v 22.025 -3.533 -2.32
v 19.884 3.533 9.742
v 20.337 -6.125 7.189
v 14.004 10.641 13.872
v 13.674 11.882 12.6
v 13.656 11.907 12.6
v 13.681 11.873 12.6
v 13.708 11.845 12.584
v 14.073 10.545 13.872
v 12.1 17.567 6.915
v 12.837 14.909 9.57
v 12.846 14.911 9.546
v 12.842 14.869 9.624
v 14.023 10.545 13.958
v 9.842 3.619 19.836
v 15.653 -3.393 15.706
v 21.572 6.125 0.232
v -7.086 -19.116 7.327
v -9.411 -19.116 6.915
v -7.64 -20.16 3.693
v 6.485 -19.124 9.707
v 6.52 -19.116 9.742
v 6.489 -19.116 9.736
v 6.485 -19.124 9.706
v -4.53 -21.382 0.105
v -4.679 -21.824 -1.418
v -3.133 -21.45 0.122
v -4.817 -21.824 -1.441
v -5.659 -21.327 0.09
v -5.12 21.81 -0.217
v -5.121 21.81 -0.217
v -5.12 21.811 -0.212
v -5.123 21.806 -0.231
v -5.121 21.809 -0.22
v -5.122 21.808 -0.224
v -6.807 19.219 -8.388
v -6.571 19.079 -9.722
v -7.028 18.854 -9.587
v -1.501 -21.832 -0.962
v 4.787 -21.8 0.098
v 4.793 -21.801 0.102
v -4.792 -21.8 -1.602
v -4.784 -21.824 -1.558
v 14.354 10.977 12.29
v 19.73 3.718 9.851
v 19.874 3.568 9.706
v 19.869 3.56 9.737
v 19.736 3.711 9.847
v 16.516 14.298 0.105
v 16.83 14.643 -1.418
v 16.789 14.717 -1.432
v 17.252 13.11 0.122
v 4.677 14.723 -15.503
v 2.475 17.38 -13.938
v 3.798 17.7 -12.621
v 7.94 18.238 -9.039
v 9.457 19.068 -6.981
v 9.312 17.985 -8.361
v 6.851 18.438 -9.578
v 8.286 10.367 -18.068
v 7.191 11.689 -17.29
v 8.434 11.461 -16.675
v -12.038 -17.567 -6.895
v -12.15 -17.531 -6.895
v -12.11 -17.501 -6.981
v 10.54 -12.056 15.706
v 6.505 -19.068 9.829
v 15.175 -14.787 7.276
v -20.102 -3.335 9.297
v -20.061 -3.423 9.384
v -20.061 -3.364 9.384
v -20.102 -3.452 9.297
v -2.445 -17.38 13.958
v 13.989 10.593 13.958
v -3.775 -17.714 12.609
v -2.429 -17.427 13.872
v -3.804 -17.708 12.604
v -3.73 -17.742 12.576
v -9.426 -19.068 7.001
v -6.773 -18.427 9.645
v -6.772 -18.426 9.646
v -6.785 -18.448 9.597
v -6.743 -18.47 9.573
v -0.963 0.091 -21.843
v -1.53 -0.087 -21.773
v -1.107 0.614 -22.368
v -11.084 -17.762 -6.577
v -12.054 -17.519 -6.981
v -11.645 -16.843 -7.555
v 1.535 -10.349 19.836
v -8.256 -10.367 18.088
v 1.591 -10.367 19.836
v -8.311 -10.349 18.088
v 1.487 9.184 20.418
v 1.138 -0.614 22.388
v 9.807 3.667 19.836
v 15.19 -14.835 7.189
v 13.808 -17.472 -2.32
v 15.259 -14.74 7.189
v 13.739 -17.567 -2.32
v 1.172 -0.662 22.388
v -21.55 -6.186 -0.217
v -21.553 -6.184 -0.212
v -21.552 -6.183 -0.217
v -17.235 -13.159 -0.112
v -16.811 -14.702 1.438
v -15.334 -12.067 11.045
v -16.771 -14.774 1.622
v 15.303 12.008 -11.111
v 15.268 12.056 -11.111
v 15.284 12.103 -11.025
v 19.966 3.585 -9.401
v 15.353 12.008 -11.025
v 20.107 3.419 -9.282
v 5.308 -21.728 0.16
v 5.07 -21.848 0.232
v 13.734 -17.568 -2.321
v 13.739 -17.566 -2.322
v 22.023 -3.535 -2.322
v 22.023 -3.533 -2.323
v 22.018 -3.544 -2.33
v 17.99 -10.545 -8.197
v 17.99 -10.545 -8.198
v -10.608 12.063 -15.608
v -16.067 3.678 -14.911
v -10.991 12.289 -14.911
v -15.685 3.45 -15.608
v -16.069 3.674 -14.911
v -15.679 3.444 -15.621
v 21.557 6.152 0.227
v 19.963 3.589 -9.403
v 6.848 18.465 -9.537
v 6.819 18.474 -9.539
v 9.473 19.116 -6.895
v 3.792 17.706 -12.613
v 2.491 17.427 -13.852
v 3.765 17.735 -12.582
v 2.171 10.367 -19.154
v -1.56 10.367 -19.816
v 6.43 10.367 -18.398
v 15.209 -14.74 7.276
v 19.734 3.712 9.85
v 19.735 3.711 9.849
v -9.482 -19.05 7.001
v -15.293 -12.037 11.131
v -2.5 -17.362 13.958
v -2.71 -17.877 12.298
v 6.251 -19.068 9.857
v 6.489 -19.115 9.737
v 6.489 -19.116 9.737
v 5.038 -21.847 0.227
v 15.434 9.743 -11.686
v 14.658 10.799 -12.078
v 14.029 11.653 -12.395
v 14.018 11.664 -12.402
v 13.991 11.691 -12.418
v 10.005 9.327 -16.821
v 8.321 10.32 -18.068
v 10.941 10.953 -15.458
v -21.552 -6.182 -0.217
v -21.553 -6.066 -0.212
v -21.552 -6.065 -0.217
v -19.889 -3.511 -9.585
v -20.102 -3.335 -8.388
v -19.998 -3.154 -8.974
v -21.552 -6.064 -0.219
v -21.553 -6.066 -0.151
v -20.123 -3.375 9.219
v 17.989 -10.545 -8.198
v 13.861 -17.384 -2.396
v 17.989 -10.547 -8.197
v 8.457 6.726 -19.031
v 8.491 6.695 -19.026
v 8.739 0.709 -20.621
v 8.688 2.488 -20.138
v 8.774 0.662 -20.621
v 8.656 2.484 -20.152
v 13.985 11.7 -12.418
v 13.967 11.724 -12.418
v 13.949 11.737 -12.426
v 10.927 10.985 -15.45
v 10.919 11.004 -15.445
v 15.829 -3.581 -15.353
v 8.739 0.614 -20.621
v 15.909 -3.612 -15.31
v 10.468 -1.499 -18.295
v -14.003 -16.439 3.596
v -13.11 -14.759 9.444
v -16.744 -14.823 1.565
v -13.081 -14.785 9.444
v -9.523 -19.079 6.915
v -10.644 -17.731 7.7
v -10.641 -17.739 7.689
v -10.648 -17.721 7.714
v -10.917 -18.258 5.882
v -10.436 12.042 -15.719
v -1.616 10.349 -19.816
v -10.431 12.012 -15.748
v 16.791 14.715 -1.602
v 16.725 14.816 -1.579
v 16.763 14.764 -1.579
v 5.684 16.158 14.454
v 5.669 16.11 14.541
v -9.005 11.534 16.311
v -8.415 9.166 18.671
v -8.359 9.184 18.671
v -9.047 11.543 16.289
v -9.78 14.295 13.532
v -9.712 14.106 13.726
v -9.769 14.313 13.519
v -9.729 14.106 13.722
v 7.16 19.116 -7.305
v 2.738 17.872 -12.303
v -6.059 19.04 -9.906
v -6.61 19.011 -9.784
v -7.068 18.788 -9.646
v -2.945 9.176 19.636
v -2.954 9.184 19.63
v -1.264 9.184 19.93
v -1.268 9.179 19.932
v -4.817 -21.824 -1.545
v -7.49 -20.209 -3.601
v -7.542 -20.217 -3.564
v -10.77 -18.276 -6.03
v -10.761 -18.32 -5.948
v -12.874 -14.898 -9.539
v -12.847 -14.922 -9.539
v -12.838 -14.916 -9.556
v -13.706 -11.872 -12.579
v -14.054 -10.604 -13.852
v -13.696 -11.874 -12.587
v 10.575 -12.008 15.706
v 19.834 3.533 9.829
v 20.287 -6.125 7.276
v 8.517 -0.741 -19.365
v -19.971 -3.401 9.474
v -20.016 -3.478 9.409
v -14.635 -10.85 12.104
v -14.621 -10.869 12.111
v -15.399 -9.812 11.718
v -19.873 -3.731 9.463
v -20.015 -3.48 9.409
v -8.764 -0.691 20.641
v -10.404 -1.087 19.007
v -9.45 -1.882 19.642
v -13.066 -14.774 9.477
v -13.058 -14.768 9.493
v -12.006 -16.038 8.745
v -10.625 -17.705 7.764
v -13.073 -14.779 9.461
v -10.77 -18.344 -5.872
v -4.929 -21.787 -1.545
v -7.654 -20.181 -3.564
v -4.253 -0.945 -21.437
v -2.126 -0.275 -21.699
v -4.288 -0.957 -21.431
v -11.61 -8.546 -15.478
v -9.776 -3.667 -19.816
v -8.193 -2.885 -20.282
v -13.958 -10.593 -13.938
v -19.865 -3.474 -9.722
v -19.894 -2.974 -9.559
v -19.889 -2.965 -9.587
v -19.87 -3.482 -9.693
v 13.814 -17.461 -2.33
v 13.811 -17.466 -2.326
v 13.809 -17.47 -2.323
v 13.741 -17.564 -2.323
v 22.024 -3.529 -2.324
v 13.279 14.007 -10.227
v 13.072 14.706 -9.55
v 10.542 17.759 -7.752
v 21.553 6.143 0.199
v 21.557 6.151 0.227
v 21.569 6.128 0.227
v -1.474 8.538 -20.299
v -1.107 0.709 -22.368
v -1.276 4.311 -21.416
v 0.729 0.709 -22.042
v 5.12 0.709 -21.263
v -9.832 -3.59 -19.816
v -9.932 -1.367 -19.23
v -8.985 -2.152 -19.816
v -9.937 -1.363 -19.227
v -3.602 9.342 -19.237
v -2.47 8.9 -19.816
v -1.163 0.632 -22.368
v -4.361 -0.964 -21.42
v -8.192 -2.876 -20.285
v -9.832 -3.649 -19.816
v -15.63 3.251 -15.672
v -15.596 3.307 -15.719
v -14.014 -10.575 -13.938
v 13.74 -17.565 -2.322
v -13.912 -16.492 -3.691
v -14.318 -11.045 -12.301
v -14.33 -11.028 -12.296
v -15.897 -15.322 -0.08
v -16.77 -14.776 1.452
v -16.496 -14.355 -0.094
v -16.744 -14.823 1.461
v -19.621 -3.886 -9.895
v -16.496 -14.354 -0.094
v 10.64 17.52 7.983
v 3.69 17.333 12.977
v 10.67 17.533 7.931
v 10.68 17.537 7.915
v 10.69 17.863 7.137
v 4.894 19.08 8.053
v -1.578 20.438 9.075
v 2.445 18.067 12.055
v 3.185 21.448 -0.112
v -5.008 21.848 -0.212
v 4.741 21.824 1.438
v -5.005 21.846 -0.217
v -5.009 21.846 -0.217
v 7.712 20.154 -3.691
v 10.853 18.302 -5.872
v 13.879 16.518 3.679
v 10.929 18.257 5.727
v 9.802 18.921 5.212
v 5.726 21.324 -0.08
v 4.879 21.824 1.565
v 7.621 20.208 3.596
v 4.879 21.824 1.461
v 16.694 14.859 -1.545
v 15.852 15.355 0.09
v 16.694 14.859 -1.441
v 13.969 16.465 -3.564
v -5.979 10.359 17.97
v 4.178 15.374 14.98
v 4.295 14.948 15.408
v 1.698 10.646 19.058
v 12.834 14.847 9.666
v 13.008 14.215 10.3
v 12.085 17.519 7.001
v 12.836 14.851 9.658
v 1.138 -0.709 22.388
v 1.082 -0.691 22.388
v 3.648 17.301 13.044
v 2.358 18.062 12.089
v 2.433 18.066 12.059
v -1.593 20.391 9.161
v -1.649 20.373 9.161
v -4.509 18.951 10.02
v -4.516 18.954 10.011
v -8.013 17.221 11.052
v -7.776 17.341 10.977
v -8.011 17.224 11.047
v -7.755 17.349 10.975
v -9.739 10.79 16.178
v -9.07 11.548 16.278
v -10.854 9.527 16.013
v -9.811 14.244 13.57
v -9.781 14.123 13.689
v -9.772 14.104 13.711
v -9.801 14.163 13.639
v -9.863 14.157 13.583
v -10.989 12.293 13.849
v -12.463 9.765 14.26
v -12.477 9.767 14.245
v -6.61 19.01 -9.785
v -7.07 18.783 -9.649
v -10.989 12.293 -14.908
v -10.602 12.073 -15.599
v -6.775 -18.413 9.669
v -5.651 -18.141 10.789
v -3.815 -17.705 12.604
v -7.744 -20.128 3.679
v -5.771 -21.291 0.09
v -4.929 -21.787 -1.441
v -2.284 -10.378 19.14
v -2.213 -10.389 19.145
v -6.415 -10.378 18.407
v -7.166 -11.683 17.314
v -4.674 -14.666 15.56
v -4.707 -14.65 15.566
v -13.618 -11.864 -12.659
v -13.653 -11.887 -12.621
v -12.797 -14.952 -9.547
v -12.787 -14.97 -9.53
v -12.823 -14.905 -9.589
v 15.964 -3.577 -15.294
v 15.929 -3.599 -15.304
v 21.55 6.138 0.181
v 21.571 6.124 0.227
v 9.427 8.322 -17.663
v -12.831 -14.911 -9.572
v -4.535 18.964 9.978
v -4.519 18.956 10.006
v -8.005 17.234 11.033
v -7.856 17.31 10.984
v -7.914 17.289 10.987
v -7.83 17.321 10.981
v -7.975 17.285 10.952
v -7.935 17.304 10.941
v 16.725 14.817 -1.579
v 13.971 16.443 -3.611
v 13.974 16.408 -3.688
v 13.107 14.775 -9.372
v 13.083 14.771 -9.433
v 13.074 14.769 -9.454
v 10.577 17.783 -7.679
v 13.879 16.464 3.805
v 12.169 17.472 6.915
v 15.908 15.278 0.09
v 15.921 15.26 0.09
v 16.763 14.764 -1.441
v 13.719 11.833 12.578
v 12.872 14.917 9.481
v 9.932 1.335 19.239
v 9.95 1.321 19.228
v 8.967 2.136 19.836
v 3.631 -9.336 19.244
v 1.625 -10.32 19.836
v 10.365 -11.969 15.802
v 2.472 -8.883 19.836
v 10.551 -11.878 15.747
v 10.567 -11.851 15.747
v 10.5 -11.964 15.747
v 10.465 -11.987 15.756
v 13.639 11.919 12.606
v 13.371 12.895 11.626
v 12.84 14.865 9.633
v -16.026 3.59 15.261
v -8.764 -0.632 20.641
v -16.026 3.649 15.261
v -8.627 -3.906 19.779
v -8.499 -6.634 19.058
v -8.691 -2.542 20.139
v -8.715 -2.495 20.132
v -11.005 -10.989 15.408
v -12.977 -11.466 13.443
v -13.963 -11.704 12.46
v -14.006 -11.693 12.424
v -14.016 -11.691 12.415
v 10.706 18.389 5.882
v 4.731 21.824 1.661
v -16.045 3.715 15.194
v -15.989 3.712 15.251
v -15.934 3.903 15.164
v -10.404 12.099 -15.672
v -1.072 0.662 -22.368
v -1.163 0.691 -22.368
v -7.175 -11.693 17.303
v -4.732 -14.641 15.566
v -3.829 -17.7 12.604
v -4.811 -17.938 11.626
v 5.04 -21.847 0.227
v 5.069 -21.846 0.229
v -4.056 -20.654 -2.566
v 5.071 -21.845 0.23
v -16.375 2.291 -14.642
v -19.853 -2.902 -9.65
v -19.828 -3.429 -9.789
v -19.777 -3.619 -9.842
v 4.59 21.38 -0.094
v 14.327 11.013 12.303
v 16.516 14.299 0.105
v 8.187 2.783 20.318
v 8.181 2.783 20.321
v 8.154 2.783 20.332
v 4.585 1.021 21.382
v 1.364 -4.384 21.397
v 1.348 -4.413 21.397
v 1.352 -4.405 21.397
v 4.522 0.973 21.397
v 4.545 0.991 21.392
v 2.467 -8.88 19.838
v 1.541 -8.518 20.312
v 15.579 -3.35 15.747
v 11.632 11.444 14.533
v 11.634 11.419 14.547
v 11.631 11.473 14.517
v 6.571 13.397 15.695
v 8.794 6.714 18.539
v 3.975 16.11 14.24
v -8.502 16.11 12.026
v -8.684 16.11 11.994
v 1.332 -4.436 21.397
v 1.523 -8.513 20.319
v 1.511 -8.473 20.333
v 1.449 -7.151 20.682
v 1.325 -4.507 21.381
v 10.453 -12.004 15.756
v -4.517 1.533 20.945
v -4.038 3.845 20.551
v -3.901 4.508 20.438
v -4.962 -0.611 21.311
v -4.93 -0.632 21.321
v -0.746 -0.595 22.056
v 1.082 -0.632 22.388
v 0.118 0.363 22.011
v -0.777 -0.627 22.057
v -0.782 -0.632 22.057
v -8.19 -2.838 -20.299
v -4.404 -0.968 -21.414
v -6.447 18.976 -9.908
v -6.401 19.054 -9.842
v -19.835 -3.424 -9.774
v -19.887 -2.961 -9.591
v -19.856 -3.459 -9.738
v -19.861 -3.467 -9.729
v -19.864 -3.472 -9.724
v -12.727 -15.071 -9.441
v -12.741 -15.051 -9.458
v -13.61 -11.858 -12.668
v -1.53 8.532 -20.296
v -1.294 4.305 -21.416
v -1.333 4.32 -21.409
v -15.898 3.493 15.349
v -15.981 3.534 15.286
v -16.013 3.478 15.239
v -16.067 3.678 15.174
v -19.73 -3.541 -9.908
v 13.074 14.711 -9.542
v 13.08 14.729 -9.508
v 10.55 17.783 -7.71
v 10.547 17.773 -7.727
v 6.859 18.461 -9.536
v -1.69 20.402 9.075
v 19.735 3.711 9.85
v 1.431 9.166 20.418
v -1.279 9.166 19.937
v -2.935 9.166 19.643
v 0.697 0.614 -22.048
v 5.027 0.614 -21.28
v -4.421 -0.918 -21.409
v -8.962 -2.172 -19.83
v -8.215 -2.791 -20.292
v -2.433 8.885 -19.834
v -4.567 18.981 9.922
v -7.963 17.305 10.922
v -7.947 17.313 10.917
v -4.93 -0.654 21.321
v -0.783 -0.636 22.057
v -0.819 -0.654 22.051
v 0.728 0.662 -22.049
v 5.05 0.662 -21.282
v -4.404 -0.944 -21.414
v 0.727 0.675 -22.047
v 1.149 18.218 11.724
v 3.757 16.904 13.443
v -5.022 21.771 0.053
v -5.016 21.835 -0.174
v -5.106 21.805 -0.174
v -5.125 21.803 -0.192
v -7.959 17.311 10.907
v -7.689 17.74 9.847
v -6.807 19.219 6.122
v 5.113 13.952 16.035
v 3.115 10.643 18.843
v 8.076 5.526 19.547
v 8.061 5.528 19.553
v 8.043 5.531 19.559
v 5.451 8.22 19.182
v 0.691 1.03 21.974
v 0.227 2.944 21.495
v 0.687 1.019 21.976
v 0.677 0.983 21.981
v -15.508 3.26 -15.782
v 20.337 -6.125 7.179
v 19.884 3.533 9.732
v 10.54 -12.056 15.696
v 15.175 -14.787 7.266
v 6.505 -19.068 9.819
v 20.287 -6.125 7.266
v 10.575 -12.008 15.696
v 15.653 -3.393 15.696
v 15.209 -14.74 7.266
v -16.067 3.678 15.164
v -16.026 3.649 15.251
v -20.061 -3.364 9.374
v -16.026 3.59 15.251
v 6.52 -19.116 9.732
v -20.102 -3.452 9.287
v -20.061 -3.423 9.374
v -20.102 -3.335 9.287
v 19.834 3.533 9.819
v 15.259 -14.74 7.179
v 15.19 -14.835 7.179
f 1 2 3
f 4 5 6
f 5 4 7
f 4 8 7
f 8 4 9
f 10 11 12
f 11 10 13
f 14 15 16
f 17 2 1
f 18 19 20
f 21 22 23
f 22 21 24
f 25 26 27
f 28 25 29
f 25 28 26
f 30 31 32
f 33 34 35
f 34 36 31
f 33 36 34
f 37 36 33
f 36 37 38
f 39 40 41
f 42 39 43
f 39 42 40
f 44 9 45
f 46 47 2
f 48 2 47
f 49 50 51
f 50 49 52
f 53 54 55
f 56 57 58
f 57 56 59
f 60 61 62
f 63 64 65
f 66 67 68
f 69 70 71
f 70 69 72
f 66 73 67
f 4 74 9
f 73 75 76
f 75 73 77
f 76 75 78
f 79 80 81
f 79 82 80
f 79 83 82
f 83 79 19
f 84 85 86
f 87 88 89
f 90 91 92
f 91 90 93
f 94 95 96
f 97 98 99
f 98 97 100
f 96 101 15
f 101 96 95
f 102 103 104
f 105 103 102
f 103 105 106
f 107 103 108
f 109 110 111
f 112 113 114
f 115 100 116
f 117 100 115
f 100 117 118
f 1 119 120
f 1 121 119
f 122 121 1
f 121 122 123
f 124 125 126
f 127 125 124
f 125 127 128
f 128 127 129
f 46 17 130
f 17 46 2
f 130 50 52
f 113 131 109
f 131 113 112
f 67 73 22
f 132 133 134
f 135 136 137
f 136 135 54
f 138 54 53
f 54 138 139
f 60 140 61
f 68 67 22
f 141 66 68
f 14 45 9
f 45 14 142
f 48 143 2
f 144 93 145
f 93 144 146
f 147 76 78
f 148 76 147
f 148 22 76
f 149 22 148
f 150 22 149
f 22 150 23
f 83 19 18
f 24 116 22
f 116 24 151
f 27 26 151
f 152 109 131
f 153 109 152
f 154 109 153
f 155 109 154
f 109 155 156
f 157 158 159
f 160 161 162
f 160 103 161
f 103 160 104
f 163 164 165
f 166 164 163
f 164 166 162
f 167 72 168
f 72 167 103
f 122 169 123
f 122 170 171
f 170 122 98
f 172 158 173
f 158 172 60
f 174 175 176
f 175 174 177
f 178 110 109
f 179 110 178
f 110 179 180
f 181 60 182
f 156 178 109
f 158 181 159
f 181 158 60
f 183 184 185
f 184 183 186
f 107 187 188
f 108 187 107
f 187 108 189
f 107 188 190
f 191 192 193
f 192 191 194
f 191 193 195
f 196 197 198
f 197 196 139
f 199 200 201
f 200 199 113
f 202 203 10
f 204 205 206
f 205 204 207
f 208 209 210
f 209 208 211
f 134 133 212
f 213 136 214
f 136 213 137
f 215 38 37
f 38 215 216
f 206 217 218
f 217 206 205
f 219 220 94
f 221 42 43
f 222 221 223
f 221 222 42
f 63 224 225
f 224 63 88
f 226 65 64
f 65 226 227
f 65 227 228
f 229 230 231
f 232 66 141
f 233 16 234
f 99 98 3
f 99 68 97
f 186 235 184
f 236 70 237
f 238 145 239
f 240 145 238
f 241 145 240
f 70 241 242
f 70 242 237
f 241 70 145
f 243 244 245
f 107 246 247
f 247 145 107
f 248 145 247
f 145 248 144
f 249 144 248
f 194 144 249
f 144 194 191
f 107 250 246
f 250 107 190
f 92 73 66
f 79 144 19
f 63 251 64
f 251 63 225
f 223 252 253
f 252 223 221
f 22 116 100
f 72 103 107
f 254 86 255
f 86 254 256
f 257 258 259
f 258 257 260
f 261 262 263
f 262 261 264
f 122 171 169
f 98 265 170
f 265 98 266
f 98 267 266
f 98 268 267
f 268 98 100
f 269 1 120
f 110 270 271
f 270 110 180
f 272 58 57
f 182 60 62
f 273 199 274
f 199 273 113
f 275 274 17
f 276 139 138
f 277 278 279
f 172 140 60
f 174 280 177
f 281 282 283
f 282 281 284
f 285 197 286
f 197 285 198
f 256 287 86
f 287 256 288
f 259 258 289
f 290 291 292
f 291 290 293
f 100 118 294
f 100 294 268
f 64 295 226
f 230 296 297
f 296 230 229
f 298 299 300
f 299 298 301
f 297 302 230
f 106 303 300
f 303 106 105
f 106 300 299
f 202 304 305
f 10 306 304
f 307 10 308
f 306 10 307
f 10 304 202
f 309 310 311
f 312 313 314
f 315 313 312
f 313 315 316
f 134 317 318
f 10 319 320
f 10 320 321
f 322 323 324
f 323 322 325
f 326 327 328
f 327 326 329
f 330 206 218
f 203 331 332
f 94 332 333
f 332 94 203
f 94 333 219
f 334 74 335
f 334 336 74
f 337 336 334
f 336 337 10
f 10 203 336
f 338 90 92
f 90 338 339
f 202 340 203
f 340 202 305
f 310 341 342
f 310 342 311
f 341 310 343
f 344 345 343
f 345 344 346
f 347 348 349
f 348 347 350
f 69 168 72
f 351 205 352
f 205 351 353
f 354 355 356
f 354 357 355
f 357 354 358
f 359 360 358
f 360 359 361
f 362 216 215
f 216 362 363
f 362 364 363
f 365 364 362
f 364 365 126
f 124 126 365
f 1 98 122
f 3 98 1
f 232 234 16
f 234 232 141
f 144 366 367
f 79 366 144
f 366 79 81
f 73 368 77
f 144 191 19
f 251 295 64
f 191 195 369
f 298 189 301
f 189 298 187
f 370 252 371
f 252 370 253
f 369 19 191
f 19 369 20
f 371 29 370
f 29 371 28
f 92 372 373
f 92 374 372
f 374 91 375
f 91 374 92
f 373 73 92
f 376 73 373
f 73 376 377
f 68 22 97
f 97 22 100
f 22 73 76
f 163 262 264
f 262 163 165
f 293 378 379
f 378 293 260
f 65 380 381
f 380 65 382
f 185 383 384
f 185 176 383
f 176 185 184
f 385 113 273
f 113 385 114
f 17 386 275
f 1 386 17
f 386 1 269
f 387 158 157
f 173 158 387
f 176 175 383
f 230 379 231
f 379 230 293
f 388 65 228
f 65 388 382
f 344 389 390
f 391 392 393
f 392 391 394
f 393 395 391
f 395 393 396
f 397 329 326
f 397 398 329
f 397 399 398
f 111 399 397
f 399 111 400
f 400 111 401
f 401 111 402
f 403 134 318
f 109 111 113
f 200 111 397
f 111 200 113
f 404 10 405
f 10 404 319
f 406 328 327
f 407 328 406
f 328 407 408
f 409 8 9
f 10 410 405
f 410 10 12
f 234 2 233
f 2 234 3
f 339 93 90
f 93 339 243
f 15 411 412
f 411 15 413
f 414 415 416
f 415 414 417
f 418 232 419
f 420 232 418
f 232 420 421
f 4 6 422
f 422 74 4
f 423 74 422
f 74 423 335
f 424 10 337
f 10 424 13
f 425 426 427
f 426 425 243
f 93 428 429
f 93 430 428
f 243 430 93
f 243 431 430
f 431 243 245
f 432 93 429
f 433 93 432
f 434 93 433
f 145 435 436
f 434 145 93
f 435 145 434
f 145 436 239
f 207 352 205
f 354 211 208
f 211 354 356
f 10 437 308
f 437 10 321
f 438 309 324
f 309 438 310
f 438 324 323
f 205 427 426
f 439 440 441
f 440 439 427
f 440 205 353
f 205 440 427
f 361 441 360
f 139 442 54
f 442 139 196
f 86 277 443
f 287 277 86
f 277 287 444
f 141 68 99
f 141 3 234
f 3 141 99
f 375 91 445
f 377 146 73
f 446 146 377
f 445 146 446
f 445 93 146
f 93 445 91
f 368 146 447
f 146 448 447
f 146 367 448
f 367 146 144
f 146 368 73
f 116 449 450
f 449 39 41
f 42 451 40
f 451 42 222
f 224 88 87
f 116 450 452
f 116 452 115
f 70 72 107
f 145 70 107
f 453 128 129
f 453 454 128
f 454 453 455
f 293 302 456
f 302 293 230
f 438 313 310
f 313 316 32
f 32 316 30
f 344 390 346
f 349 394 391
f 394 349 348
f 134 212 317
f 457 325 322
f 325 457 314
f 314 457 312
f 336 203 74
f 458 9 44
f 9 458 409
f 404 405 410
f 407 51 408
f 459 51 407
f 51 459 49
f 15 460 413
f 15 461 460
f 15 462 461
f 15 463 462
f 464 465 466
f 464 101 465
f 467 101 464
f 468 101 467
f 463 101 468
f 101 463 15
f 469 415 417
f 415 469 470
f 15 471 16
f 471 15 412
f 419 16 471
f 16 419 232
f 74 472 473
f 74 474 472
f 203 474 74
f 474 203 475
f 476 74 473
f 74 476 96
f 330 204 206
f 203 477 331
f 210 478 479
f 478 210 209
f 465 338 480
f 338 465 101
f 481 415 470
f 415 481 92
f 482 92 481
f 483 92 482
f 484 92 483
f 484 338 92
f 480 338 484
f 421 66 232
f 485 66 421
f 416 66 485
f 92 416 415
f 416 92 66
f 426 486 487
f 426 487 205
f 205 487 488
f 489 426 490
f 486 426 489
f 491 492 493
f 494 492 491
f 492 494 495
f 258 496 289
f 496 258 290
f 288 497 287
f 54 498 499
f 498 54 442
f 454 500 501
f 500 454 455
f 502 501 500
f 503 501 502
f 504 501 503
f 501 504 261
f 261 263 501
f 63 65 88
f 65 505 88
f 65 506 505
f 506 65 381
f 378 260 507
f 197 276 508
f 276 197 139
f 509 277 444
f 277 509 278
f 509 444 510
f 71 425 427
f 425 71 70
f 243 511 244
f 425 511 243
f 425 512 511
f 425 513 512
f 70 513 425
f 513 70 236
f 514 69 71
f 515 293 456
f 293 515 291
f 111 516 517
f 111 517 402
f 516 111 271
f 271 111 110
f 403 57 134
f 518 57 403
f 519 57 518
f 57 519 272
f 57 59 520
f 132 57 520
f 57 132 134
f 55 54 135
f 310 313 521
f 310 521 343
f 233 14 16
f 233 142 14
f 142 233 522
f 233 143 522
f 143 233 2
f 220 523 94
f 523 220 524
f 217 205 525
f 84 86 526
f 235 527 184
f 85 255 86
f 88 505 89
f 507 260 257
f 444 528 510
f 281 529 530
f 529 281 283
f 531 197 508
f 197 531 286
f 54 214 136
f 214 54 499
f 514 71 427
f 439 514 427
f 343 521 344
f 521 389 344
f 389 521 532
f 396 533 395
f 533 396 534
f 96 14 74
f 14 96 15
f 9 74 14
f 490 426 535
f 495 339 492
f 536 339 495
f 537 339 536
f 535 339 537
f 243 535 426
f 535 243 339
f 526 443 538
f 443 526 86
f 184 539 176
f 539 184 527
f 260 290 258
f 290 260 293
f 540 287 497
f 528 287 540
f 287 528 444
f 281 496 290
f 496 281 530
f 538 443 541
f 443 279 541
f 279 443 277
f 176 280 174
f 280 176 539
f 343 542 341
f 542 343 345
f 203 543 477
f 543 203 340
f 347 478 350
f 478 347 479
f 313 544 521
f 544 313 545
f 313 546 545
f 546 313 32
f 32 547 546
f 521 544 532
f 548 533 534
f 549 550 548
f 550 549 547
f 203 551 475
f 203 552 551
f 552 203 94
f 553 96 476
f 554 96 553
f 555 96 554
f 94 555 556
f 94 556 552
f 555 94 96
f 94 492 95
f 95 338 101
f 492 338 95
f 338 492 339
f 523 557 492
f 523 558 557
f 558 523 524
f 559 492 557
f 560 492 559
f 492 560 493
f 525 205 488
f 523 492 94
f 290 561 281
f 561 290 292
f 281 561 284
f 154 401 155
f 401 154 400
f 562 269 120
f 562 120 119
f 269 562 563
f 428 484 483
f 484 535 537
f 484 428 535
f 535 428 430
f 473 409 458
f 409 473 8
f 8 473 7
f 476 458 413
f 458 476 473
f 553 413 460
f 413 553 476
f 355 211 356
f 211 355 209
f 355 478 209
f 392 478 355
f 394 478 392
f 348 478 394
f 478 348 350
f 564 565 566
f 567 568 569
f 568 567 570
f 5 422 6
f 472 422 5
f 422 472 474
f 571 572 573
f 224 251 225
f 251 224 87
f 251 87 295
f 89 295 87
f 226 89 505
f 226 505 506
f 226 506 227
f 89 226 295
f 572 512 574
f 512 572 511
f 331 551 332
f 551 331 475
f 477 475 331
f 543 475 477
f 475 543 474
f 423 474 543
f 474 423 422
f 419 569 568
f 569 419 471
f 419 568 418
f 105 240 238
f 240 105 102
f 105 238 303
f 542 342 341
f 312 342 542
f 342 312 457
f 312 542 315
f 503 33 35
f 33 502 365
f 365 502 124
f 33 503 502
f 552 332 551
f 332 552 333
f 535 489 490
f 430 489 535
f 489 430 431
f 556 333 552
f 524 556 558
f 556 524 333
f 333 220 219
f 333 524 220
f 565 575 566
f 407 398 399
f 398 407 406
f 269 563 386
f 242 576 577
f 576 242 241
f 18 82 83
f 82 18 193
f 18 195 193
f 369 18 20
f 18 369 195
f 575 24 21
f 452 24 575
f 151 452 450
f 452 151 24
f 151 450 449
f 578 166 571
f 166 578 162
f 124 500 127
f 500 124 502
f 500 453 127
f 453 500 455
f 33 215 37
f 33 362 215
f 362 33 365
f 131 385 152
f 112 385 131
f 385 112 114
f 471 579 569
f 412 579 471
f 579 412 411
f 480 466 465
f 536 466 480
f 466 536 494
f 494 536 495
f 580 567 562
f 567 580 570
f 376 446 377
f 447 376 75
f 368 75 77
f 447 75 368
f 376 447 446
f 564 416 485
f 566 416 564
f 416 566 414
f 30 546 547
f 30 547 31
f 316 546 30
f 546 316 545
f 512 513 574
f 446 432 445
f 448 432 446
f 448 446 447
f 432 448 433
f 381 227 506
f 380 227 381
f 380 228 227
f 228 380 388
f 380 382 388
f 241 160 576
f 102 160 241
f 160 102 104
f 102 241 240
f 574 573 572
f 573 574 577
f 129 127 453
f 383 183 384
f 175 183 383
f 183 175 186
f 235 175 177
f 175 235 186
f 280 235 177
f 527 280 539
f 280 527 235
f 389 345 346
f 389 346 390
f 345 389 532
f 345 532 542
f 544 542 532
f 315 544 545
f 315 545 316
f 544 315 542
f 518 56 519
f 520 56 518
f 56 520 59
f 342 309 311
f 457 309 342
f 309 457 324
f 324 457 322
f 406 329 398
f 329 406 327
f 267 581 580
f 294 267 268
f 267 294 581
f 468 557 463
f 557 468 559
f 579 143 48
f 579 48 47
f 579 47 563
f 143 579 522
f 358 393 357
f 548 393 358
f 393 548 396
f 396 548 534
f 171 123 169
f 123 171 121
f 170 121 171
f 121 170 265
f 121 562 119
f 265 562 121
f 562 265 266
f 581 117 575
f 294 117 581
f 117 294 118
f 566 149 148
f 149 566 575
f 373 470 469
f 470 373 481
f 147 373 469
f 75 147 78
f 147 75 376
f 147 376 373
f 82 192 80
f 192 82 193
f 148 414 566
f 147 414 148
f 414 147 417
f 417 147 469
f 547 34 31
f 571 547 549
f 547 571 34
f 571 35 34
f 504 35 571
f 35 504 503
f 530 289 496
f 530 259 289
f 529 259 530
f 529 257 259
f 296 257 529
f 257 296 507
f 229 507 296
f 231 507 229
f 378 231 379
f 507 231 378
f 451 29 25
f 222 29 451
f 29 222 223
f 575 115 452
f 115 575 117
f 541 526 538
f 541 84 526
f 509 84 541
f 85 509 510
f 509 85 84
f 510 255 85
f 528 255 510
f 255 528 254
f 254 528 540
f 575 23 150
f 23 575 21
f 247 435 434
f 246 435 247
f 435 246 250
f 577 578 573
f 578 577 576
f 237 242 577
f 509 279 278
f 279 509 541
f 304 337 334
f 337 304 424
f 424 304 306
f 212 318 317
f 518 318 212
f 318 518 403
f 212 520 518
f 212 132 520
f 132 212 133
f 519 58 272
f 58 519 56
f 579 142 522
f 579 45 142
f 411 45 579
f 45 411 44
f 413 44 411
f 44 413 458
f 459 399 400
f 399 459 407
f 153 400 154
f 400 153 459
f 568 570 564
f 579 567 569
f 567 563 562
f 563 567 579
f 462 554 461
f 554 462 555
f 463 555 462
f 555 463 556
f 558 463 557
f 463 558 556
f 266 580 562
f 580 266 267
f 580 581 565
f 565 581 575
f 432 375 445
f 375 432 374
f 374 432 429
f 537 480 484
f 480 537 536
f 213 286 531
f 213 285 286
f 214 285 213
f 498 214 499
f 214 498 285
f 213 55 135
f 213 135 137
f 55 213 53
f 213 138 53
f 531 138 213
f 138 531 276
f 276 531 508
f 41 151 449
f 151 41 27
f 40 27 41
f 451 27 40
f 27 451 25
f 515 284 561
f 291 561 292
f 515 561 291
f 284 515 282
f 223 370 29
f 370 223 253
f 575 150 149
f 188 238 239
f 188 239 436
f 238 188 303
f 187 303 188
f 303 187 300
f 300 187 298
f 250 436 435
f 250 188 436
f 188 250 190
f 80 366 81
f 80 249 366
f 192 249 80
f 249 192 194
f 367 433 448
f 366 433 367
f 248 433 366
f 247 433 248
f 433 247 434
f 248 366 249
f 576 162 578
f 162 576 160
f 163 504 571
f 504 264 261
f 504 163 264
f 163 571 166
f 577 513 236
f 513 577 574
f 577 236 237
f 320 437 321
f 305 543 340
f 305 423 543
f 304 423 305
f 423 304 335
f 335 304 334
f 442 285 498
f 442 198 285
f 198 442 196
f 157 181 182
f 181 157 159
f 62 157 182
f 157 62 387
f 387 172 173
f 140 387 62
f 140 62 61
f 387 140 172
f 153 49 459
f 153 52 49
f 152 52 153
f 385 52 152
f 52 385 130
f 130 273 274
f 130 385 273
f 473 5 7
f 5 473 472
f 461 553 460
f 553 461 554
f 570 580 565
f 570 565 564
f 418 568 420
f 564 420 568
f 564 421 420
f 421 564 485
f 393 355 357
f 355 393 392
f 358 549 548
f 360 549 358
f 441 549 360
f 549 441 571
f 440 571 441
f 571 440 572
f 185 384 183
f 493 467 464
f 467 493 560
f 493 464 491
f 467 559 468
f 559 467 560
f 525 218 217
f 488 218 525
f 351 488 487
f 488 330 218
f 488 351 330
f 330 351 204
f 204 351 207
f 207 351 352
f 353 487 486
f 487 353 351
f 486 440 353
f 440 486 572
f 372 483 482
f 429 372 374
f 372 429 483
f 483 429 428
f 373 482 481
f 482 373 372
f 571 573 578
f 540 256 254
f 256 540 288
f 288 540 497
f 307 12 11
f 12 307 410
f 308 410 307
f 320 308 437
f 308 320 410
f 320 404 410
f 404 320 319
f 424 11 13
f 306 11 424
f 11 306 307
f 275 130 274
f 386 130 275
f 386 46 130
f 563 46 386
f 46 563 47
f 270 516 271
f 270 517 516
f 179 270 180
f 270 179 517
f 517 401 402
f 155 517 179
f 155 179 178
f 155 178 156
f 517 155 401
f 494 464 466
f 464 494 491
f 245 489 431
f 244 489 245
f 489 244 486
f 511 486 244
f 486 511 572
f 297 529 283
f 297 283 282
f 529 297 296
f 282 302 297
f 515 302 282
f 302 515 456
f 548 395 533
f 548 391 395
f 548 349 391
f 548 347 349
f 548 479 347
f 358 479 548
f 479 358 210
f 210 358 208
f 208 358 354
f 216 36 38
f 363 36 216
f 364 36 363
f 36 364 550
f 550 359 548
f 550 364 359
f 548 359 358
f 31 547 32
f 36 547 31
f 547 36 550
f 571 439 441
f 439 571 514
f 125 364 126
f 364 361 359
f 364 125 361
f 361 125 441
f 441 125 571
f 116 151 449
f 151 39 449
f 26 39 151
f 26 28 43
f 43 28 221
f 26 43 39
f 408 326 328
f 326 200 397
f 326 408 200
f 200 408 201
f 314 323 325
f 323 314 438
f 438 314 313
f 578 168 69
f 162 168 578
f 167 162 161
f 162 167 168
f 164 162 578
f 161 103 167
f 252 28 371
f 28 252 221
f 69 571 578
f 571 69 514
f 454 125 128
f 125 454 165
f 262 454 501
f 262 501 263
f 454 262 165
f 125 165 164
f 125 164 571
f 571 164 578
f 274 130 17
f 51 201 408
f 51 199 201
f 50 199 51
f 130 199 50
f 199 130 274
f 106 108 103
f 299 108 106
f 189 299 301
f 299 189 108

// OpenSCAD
// Auto-generated OpenSCAD file

    shift = 0.01;

    inner_points = 10*[[-2.147181721933595, -0.6125228911105931, -0.022233721226839975], [1.4975738002339152, 1.2171443618142557, 1.123343354837028], [-1.6663340255978591, -1.4763745869015392, -0.1723861125089058], [1.9784214965696507, 0.35329266602330955, 0.9731909635549623], [-1.9784214965696507, -0.35329266602330955, -0.9731909635549623], [1.6663340255978591, 1.4763745869015392, 0.1723861125089058], [-1.4975738002339152, -1.2171443618142557, -1.123343354837028], [2.147181721933595, 0.6125228911105931, 0.022233721226839975], [-1.0280687737374308, -0.3330955036984619, 1.954018925031606], [-0.1676587091381568, 0.0988303441971033, 2.224452988448126], [-0.547221077401695, -1.1969471994894083, 1.80386653374954], [0.313188987197579, -0.765021351593843, 2.07430059716606], [-0.313188987197579, 0.765021351593843, -2.07430059716606], [0.547221077401695, 1.1969471994894083, -1.80386653374954], [0.1676587091381568, -0.0988303441971033, -2.224452988448126], [1.0280687737374308, 0.3330955036984619, -1.954018925031606], [-0.6726268446335121, 1.9160150643285994, 0.9287235210998099], [0.503866619269568, -2.1752452894158827, 0.022233721228312353], [2.0237176723082113, -0.6125228911102443, 0.7179487921524583], [-0.503866619269568, 2.1752452894158827, -0.022233721228312353], [0.6726268446335121, -1.9160150643285994, -0.9287235210998099], [2.1924778976721555, -0.3532926660229606, -0.23300845017566402], [0.927058622781811, 1.9121577495628521, 0.685771848512618], [-0.927058622781811, -1.9121577495628521, -0.685771848512618], [1.3708203463401416, -1.7471767562861986, -0.23300845017492777], [-1.4315815123496172, -1.0343501578436425, 1.3662950274254113], [0.8210012810337749, 0.09644639256656445, 2.0743005971656054], [-0.8210012810337749, -0.09644639256656445, -2.0743005971656054], [1.4315815123496172, 1.0343501578436425, -1.3662950274254113], [-1.0907716573533395, 1.2233856282105418, 1.516447418706741], [0.6489516514014413, -1.9020591684003363, 0.9731909635561535], [-0.6489516514014413, 1.9020591684003363, -0.9731909635561535], [1.0907716573533395, -1.2233856282105418, -1.516447418706741], [-2.0020966898017214, -0.33933677009504604, 0.9287235211010012], [0.7822487677665146, 1.0584046349342373, 1.8038665337483493], [-1.2240687737184126, -1.7370781751240318, 0.6857718485145453], [1.5602766838498234, -0.3393367700947481, 1.5609148611618933], [-1.5602766838498234, 0.3393367700947481, -1.5609148611618933], [1.2240687737184126, 1.7370781751240318, -0.6857718485145453], [-0.7822487677665146, -1.0584046349342373, -1.8038665337483493], [2.0020966898017214, 0.33933677009504604, -0.9287235211010012], [-1.5985839511895352, 0.36191788405013425, 1.516447418707196], [-0.20641122240541715, 1.0607885865647761, 1.9540189250308702], [-0.33970833877049067, -1.8996752167697974, 1.1233433548386742], [1.0524643900136275, -1.2008045142551556, 1.5609148611623485], [-1.0524643900136275, 1.2008045142551556, -1.5609148611623485], [0.33970833877049067, 1.8996752167697974, -1.1233433548386742], [0.20641122240541715, -1.0607885865647761, -1.9540189250308702], [1.5985839511895352, -0.36191788405013425, -1.516447418707196], [0.21173359031441008, 1.7534180226828338, 1.366295027423939], [-0.48479337090236396, -2.1728613377853443, 0.17238611251083324], [1.5159053784720158, -1.473990635270652, 0.7179487921529134], [0.48479337090236396, 2.1728613377853443, -0.17238611251083324], [-0.21173359031441008, -1.7534180226828338, -1.366295027423939], [1.7889651590599696, -1.0545473201681412, -0.8207323477818588]];

    outer_points_unshifted = 10*[[0.8723958733185133, 0.06615064908058033, -2.0544141523419364], [0.15751608677391848, -1.0319662062139903, 1.973905369854271], [0.8270996975796362, 1.0319662062139903, -1.7991719809389455], [0.11221991103504136, -0.06615064908058033, 2.229147541257262], [-0.11221991103504136, 0.06615064908058033, -2.229147541257262], [-0.8270996975796362, -1.0319662062139903, 1.7991719809389455], [-0.15751608677391848, 1.0319662062139903, -1.973905369854271], [-0.8723958733185133, -0.06615064908058033, 2.0544141523419364], [2.1924778976724366, -0.35329266602279574, -0.23300845017327093], [2.0237176723073724, -0.6125228911106142, 0.7179487921545069], [2.1471817219335594, 0.6125228911106142, 0.022233721229720005], [1.9784214965684954, 0.35329266602279574, 0.9731909635574978], [-1.9784214965684954, -0.35329266602279574, -0.9731909635574978], [-2.1471817219335594, -0.6125228911106142, -0.022233721229720005], [-2.0237176723073724, 0.6125228911106142, -0.7179487921545069], [-2.1924778976724366, 0.35329266602279574, 0.23300845017327093], [0.5038666192695755, -2.1752452894158876, 0.022233721227690392], [0.4807491650839791, 2.1752452894158876, 0.15249966768763507], [0.14717764696877234, 0.9136323277340612, 2.0321620721418276], [-0.4807491650839791, -2.1752452894158876, -0.15249966768763507], [-0.5038666192695755, 2.1752452894158876, -0.022233721227690392], [-0.8374381373847823, 0.9136323277340612, 1.8574286832265023], [-0.24599665183756222, -1.7332208603588481, 1.3861814722472068], [0.24599665183756222, 1.7332208603588481, -1.3861814722472068], [-0.16086561818353615, 2.034330296982295, 0.9064714408993516], [2.0020966898028134, 0.33933677009559726, -0.9287235210984455], [1.5602766838479842, -0.33933677009559726, 1.560914861163547], [-1.5602766838479842, 0.33933677009559726, -1.560914861163547], [-2.0020966898028134, -0.33933677009559726, 0.9287235210984455], [1.3708203463404445, -1.7471767562860465, -0.23300845017428576], [1.2069372429567986, 1.7471767562860465, 0.690466401324062], [-1.2069372429567986, -1.7471767562860465, -0.690466401324062], [-1.3708203463404445, 1.7471767562860465, 0.23300845017428576], [1.598583951191333, -0.3619178840492606, -1.5164474187055097], [1.0524643900118018, -1.2008045142560126, 1.56091486116292], [1.5252931992854413, 1.2008045142560126, -1.103456910013144], [0.9791736381059102, 0.3619178840492606, 1.9739053698552858], [-0.9791736381059102, -0.3619178840492606, -1.9739053698552858], [-1.5252931992854413, -1.2008045142560126, 1.103456910013144], [-1.0524643900118018, 1.2008045142560126, -1.56091486116292], [-1.598583951191333, 0.3619178840492606, 1.5164474187055097], [1.7889651590609557, -1.0545473201676536, -0.820732347780335], [1.5159053784711902, -1.4739906352710297, 0.7179487921538799], [1.6703782314161868, 1.4739906352710297, -0.1524996676849783], [1.3973184508264214, 1.0545473201676536, 1.3861814722492365], [-1.3973184508264214, -1.0545473201676536, -1.3861814722492365], [-1.6703782314161868, -1.4739906352710297, 0.1524996676849783], [-1.5159053784711902, 1.4739906352710297, -0.7179487921538799], [-1.7889651590609557, 1.0545473201676536, 0.820732347780335], [0.6489516514003212, -1.9020591684008705, 0.9731909635558559], [0.9441901535433673, 1.9020591684008705, -0.6904664013214051], [0.5653224596892834, 1.6062617638524541, 1.4444381745357786], [-0.9441901535433673, -1.9020591684008705, 0.6904664013214051], [-0.6489516514003212, 1.9020591684008705, -0.9731909635558559], [-1.027819345254405, 1.6062617638524541, 1.1617136123013276]];
    
    outer_points = [for (p = outer_points_unshifted) [p[0], p[1], p[2] + shift]];

    // Convex hull for inner set (I)
    module inner_hull() {
        hull() {
            for (p = inner_points) {
                translate(p) sphere(r=0.1);
            }
        }
    }

    // Convex hull for outer set (O) minus inner hull (O \ I)
    module outer_minus_inner() {
        difference() {
            hull() {
                for (p = outer_points) {
                    translate(p) sphere(r=0.1);
                }
            }
            inner_hull(); // Subtract inner hull
        }
    }

    // Convex hull for outer set (O) minus all translated inner hulls
    module outer_minus_AllTranslationInner() {
        difference() {
            hull() {
                for (p = outer_points) {
                    translate(p) sphere(r=0.1);
                }
            }
            hull() {
                translate([0,0,50]) inner_hull();
                translate([0,0,-50]) inner_hull();
            }; // Subtract translated inner hulls
        }
    }

    // Difference between outer_minus_inner and outer_minus_AllTranslationInner
    module outer_minus_inner_diff() {
        difference() {
            // Outer minus inner
            difference() {
                hull() {
                    for (p = outer_points) {
                        translate(p) sphere(r=0.1);
                    }
                }
                inner_hull();
            }

            // Subtract Outer minus AllTranslationInner
            difference() {
                hull() {
                    for (p = outer_points) {
                        translate(p) sphere(r=0.1);
                    }
                }
                hull() {
                    translate([0,0,50]) inner_hull();
                    translate([0,0,-50]) inner_hull();
                };
            }
        }
    }

    // Rendering all with colors applied
    // color([1, 0, 0, 0.5]) inner_hull(); // Transparent red
    // color([0, 1, 0, 1]) outer_minus_AllTranslationInner(); // Opaque green
    color([1, 1, 0, 1]) outer_minus_inner_diff(); // Opaque yellow
    
